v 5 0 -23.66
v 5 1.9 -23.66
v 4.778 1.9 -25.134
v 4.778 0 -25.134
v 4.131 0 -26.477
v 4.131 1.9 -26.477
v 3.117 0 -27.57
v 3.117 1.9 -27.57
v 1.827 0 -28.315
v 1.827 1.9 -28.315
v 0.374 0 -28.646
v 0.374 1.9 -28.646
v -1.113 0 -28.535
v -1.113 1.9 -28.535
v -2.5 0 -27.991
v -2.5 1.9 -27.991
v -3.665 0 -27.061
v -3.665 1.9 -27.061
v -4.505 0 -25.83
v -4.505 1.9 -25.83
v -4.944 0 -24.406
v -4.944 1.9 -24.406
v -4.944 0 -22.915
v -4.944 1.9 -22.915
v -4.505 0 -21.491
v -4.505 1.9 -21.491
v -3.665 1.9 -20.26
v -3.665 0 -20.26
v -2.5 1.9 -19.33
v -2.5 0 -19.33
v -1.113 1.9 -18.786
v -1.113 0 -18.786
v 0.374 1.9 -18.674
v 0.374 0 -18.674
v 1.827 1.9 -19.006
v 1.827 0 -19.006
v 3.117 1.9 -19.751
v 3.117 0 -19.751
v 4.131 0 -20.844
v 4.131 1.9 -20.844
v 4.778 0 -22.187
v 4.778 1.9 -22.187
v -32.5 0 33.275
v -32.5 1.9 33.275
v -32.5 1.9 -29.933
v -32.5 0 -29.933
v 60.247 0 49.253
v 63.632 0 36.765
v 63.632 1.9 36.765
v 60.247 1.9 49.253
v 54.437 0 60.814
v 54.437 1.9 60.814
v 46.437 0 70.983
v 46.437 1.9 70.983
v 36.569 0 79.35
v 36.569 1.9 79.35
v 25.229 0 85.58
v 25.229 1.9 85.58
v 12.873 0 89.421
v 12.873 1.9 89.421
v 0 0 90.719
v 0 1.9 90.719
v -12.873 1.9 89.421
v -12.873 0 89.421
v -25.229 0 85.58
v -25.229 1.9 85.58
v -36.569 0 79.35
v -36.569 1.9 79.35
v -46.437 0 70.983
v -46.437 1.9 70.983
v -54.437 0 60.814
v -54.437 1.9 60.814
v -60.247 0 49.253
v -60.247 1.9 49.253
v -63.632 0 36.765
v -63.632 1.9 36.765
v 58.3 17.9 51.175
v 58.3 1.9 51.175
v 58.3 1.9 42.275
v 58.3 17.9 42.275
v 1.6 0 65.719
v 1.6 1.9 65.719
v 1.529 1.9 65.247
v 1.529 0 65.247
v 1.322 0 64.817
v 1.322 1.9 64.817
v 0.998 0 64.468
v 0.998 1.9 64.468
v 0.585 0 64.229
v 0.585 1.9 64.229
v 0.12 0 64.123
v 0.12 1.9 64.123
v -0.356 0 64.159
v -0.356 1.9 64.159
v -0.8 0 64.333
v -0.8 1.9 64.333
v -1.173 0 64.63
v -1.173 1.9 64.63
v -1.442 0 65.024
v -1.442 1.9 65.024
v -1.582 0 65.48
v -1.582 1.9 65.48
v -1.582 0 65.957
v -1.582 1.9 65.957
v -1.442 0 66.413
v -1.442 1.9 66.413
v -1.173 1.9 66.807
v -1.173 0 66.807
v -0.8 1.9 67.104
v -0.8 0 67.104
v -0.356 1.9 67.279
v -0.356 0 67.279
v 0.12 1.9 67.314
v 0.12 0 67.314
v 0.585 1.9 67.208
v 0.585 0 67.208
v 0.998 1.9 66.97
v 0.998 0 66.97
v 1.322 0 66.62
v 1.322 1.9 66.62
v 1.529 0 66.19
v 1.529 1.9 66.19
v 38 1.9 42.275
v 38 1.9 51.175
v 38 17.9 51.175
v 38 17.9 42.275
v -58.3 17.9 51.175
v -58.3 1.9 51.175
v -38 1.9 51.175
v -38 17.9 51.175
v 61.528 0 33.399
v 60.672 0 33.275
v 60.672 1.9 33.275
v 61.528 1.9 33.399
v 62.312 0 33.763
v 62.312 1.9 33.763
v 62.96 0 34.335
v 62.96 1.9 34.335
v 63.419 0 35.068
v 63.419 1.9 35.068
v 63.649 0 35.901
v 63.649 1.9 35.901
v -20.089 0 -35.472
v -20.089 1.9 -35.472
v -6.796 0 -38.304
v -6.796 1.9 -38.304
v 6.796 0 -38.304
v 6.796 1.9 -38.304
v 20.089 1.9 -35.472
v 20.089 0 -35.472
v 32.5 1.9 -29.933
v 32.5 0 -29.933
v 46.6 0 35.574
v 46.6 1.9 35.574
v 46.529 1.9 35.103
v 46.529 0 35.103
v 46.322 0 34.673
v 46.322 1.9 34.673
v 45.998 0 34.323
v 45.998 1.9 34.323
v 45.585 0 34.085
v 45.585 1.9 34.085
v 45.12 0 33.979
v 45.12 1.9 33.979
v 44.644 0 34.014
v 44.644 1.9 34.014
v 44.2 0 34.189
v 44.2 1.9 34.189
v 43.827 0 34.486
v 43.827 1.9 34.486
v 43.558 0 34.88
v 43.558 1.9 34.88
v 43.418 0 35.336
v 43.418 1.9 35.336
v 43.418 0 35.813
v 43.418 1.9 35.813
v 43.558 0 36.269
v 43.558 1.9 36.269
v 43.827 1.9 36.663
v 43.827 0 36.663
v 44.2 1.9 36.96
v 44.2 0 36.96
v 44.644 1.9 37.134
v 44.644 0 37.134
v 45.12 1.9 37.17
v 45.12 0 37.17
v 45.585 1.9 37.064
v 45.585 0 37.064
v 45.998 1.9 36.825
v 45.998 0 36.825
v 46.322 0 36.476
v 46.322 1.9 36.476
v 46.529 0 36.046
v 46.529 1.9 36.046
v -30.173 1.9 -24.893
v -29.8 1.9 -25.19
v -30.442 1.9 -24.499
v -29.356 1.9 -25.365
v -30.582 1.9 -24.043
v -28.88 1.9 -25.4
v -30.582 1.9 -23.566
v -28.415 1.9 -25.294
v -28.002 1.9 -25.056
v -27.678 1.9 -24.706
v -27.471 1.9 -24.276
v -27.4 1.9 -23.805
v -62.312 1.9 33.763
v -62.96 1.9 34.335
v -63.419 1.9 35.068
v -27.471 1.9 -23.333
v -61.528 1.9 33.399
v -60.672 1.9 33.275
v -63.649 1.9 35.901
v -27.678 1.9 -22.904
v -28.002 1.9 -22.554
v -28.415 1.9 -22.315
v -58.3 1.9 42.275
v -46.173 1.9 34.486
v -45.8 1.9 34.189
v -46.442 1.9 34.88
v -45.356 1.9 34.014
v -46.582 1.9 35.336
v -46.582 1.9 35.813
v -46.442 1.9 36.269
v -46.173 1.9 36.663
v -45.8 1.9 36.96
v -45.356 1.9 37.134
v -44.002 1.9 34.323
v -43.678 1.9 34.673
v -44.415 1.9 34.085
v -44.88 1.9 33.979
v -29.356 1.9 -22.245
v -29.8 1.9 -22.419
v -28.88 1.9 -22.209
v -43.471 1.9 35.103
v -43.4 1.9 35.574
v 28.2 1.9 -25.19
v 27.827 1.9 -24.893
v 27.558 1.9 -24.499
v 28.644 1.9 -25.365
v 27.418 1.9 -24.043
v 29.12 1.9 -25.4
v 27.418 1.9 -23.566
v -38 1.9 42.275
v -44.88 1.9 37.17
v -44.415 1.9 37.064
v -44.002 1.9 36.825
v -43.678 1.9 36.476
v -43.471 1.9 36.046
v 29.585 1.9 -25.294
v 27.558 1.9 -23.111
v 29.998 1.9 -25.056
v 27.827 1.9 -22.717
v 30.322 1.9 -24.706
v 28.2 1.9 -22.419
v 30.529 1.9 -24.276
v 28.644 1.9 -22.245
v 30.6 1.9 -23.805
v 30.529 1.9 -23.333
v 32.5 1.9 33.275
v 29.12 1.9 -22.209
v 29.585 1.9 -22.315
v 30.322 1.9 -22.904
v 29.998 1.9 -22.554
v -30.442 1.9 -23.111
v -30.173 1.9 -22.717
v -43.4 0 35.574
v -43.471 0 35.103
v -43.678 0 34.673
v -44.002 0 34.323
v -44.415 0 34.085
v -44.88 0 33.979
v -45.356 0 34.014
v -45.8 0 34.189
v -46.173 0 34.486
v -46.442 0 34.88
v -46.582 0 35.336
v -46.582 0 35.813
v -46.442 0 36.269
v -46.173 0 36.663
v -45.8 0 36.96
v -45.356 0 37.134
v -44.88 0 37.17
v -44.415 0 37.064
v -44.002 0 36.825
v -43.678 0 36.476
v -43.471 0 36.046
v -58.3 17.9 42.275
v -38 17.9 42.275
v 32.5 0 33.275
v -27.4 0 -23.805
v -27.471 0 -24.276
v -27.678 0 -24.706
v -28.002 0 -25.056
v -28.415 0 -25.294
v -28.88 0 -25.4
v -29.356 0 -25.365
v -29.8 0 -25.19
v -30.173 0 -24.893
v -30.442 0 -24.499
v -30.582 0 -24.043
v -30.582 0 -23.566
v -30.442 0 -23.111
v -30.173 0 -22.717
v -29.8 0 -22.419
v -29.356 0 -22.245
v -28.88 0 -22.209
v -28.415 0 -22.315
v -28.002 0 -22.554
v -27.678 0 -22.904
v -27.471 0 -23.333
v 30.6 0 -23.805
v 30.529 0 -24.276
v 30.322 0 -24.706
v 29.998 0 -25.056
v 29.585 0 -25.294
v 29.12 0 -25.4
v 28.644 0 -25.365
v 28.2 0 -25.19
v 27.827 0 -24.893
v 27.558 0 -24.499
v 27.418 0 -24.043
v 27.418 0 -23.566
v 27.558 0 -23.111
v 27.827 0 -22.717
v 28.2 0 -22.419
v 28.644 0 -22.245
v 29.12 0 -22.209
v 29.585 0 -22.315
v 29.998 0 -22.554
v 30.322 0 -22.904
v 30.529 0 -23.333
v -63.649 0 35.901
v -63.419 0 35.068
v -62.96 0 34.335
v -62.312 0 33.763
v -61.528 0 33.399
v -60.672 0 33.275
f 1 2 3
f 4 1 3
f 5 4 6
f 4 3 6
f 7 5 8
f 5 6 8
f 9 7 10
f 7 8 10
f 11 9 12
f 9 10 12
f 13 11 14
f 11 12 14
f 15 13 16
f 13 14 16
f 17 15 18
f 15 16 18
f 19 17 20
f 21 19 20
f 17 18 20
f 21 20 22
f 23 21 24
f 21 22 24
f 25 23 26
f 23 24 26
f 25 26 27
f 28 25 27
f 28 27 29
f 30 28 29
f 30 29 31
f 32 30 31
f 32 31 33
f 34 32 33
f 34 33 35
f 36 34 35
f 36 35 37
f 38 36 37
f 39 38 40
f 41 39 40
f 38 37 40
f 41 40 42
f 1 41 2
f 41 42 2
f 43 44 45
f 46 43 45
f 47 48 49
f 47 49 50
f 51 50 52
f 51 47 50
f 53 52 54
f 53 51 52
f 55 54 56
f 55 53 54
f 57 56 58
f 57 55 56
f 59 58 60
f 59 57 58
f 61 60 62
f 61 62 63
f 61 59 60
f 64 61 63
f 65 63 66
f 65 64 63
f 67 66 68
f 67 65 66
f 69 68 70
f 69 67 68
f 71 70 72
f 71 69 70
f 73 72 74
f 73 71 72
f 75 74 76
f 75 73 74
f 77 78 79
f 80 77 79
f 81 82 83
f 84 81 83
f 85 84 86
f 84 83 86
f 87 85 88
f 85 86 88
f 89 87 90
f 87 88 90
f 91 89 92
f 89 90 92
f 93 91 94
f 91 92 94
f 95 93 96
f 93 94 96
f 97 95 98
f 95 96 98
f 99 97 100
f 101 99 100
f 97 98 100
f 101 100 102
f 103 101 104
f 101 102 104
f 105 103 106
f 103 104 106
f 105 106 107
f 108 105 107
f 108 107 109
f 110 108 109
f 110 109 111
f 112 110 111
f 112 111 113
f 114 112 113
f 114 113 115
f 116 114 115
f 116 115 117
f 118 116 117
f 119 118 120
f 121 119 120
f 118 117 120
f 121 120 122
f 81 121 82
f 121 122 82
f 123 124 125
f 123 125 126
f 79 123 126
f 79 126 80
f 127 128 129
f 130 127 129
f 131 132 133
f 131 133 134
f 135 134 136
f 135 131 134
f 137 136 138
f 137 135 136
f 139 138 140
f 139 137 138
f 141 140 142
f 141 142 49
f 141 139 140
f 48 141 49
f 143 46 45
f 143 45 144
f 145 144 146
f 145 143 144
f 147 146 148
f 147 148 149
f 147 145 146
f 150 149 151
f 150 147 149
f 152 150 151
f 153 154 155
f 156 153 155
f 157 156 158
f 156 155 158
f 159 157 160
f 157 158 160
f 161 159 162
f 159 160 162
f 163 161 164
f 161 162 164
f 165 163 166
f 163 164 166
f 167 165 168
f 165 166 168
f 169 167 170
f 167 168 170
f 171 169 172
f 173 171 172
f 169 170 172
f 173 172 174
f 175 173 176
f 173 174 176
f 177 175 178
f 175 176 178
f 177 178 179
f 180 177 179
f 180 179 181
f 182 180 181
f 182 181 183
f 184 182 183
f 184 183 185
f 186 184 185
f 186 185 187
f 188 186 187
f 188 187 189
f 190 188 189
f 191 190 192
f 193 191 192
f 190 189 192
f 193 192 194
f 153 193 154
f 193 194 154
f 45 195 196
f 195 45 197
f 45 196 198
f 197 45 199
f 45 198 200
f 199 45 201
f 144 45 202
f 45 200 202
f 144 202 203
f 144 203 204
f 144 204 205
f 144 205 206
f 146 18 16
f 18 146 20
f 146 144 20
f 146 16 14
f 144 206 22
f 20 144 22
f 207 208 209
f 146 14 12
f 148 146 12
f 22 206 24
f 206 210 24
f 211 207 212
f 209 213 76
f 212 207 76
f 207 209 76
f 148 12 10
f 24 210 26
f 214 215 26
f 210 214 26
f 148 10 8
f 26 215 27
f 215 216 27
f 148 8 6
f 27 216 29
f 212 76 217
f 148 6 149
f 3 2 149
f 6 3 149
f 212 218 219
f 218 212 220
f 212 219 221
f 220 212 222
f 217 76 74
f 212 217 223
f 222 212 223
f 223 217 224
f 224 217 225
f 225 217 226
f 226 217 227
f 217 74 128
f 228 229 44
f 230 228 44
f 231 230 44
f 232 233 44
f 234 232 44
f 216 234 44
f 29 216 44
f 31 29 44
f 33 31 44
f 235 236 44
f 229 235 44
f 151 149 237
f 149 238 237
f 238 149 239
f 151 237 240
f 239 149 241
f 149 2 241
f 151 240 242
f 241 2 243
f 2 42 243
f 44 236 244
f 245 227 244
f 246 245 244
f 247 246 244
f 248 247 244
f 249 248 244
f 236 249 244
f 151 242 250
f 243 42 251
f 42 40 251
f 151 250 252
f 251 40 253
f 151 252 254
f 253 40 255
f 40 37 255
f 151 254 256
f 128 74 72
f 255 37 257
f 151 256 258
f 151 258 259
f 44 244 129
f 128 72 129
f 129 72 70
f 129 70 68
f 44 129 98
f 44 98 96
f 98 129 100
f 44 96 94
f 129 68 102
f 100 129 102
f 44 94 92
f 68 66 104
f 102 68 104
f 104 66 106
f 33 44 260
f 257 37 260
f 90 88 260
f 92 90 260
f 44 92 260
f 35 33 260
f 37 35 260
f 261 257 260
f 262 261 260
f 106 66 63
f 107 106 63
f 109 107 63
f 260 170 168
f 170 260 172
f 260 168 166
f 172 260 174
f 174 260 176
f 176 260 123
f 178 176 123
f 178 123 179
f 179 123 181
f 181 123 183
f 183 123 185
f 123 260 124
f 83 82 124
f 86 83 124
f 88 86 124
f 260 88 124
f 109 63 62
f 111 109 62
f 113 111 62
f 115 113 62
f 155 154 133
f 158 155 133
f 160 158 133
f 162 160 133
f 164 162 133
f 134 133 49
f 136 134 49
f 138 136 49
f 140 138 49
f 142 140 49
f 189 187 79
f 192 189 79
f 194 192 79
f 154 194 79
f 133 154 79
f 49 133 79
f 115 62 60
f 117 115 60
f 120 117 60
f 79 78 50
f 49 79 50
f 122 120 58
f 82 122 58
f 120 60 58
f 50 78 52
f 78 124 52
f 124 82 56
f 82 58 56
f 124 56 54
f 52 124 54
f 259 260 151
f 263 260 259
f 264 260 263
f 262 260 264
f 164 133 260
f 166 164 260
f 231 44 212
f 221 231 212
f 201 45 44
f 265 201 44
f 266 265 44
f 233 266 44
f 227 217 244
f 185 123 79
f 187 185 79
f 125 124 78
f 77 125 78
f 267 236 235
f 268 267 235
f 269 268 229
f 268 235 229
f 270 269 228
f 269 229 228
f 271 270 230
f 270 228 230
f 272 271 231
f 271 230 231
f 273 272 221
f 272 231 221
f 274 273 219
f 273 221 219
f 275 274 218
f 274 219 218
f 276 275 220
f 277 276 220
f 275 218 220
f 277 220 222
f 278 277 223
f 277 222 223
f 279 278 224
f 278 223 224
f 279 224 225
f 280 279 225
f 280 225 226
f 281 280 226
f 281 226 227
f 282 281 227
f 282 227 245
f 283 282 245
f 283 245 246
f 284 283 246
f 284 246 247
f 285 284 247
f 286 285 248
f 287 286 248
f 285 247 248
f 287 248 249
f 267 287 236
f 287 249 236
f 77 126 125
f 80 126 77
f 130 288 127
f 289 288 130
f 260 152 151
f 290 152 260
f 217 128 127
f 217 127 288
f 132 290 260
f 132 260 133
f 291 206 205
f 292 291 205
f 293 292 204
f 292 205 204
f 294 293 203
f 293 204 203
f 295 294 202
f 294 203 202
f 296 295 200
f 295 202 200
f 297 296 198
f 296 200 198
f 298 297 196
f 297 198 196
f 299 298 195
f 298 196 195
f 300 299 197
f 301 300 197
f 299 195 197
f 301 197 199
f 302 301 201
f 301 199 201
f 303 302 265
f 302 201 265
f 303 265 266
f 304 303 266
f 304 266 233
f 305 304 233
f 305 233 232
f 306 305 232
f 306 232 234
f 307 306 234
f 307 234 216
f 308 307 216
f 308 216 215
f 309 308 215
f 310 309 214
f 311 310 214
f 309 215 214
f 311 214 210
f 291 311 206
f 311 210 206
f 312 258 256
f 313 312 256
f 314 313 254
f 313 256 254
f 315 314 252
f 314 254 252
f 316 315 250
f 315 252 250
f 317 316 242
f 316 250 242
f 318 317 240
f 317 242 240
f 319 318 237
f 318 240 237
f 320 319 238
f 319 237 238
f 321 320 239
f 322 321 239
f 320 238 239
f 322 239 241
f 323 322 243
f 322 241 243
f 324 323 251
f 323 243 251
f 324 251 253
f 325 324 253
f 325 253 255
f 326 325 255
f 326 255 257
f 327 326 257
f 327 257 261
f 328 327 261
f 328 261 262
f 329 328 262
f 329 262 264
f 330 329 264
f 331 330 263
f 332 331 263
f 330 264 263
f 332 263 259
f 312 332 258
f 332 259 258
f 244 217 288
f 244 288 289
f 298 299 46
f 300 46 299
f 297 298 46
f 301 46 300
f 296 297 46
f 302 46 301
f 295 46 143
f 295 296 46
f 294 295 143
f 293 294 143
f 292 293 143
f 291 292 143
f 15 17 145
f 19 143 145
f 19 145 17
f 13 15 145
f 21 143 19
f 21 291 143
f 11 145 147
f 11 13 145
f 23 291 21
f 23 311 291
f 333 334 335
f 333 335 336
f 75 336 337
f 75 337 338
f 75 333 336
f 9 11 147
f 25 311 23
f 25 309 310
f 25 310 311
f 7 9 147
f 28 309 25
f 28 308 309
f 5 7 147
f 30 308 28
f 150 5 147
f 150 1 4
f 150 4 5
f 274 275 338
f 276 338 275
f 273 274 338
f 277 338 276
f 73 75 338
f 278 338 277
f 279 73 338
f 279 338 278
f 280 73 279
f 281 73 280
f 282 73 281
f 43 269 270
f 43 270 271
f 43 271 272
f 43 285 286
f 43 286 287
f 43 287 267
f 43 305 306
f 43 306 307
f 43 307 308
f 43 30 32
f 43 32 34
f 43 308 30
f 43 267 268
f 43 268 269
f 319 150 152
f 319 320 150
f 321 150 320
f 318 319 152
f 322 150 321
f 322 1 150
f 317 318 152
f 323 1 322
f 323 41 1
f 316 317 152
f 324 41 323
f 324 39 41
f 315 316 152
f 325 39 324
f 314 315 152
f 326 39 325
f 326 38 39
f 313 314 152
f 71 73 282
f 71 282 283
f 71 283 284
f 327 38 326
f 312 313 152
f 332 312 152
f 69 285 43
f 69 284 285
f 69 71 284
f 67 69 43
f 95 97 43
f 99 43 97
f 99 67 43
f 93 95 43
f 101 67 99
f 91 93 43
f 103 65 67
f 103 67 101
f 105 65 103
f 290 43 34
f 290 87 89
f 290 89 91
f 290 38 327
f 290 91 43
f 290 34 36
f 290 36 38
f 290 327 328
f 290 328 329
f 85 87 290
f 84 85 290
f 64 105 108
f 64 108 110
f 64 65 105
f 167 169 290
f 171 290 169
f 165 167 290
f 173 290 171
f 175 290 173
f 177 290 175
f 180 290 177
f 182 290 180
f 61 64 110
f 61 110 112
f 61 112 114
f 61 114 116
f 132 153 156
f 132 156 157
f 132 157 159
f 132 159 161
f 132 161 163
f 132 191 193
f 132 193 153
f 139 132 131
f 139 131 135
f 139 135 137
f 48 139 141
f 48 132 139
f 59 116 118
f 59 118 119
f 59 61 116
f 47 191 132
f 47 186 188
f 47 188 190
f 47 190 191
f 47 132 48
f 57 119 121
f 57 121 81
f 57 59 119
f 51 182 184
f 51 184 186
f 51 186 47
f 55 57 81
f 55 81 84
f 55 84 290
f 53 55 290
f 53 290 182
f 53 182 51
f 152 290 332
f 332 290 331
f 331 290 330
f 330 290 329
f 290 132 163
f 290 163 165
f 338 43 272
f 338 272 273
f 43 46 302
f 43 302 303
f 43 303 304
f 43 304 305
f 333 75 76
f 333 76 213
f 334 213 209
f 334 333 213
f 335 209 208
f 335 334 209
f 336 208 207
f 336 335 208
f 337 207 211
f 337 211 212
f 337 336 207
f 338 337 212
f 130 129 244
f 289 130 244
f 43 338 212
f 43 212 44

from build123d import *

# Parameters (mm, degrees)
SKETCH1_W           = 36
SKETCH1_H           = 20
BOSS_EXTRUDE1_DEPTH = 1.9
BOSS_EXTRUDE2_DEPTH = 1.9
CUT_EXTRUDE1_DEPTH  = 10
SKETCH5_R           = 5
CUT_EXTRUDE2_DEPTH  = 1.9
SKETCH6_R           = 1.6
CUT_EXTRUDE3_DEPTH  = 1.9
ESQUISSE1_W         = 20.3
ESQUISSE1_H         = 8.9
BOSS_EXTRU_1_DEPTH  = 16


with BuildPart() as part:
    # Sketch1 → Boss-Extrude1 (new body)
    with BuildSketch(Plane(origin=(0, 0, 0), x_dir=(1, 0, 0), z_dir=(0, 1, 0))):
        Rectangle(SKETCH1_W, SKETCH1_H)
    extrude(amount=BOSS_EXTRUDE1_DEPTH)

    # Sketch3 → Boss-Extrude2 (add)
    with BuildSketch(Plane.XZ):
        with BuildLine():
            Line((37.5, -26.725181376), (32.5, -26.725181376))
            Line((32.5, -26.725181376), (32.5, 33.274818624))
            Line((32.5, 33.274818624), (60.67226545, 33.274818624))
            ThreePointArc((60.67226545, 33.274818624), (62.960456011, 34.334668125), (63.631888155, 36.765362653))
            ThreePointArc((63.631888155, 36.765362653), (0, 90.718666019), (-63.631888155, 36.765362653))
            ThreePointArc((-63.631888155, 36.765362653), (-62.960456011, 34.334668125), (-60.67226545, 33.274818624))
            Line((-60.67226545, 33.274818624), (-32.5, 33.274818624))
            Line((-32.5, 33.274818624), (-32.5, -26.725181376))
            Line((-32.5, -26.725181376), (-37.5, -26.725181376))
            ThreePointArc((-37.5, -26.725181376), (0, -38.660459877), (37.5, -26.725181376))
        make_face()
    extrude(amount=-BOSS_EXTRUDE2_DEPTH)

    # Sketch4 → Cut-Extrude1 (cut)
    with BuildSketch(Plane(origin=(0, 1.9, 0), x_dir=(1, 0, 0), z_dir=(0, 1, 0))):
        Polygon((-32.5, 26.725181376), (-32.5, 34.194748576), (-40.442086395, 34.194748576), (-37.5, 26.725181376), align=None)
        Polygon((37.5, 26.725181376), (32.5, 26.725181376), (32.5, 34.194748576), (40.442086395, 34.194748576), align=None)
    extrude(amount=-CUT_EXTRUDE1_DEPTH, mode=Mode.SUBTRACT)

    # Sketch5 → Cut-Extrude2 (cut)
    with BuildSketch(Plane(origin=(0, 1.9, 0), x_dir=(1, 0, 0), z_dir=(0, 1, 0))):
        with Locations((0, 23.660459877)):
            Circle(SKETCH5_R)
    extrude(amount=-CUT_EXTRUDE2_DEPTH, mode=Mode.SUBTRACT)

    # Sketch6 → Cut-Extrude3 (cut)
    with BuildSketch(Plane(origin=(0, 1.9, 0), x_dir=(1, 0, 0), z_dir=(0, 1, 0))):
        with Locations((0, -65.718666019)):
            Circle(SKETCH6_R)
        with Locations((-45, -35.574302205)):
            Circle(SKETCH6_R)
        with Locations((45, -35.574302205)):
            Circle(SKETCH6_R)
        with Locations((-29, 23.804823691)):
            Circle(SKETCH6_R)
        with Locations((29, 23.804823691)):
            Circle(SKETCH6_R)
    extrude(amount=-CUT_EXTRUDE3_DEPTH, mode=Mode.SUBTRACT)

    # Esquisse1 → Boss.-Extru.1 (add)
    with BuildSketch(Plane(origin=(0, 1.9, 0), x_dir=(1, 0, 0), z_dir=(0, 1, 0))):
        with Locations((48.15, -46.724818624)):
            Rectangle(ESQUISSE1_W, ESQUISSE1_H)
        with Locations((-48.15, -46.724818624)):
            Rectangle(ESQUISSE1_W, ESQUISSE1_H)
    extrude(amount=BOSS_EXTRU_1_DEPTH)


solid = part.part
